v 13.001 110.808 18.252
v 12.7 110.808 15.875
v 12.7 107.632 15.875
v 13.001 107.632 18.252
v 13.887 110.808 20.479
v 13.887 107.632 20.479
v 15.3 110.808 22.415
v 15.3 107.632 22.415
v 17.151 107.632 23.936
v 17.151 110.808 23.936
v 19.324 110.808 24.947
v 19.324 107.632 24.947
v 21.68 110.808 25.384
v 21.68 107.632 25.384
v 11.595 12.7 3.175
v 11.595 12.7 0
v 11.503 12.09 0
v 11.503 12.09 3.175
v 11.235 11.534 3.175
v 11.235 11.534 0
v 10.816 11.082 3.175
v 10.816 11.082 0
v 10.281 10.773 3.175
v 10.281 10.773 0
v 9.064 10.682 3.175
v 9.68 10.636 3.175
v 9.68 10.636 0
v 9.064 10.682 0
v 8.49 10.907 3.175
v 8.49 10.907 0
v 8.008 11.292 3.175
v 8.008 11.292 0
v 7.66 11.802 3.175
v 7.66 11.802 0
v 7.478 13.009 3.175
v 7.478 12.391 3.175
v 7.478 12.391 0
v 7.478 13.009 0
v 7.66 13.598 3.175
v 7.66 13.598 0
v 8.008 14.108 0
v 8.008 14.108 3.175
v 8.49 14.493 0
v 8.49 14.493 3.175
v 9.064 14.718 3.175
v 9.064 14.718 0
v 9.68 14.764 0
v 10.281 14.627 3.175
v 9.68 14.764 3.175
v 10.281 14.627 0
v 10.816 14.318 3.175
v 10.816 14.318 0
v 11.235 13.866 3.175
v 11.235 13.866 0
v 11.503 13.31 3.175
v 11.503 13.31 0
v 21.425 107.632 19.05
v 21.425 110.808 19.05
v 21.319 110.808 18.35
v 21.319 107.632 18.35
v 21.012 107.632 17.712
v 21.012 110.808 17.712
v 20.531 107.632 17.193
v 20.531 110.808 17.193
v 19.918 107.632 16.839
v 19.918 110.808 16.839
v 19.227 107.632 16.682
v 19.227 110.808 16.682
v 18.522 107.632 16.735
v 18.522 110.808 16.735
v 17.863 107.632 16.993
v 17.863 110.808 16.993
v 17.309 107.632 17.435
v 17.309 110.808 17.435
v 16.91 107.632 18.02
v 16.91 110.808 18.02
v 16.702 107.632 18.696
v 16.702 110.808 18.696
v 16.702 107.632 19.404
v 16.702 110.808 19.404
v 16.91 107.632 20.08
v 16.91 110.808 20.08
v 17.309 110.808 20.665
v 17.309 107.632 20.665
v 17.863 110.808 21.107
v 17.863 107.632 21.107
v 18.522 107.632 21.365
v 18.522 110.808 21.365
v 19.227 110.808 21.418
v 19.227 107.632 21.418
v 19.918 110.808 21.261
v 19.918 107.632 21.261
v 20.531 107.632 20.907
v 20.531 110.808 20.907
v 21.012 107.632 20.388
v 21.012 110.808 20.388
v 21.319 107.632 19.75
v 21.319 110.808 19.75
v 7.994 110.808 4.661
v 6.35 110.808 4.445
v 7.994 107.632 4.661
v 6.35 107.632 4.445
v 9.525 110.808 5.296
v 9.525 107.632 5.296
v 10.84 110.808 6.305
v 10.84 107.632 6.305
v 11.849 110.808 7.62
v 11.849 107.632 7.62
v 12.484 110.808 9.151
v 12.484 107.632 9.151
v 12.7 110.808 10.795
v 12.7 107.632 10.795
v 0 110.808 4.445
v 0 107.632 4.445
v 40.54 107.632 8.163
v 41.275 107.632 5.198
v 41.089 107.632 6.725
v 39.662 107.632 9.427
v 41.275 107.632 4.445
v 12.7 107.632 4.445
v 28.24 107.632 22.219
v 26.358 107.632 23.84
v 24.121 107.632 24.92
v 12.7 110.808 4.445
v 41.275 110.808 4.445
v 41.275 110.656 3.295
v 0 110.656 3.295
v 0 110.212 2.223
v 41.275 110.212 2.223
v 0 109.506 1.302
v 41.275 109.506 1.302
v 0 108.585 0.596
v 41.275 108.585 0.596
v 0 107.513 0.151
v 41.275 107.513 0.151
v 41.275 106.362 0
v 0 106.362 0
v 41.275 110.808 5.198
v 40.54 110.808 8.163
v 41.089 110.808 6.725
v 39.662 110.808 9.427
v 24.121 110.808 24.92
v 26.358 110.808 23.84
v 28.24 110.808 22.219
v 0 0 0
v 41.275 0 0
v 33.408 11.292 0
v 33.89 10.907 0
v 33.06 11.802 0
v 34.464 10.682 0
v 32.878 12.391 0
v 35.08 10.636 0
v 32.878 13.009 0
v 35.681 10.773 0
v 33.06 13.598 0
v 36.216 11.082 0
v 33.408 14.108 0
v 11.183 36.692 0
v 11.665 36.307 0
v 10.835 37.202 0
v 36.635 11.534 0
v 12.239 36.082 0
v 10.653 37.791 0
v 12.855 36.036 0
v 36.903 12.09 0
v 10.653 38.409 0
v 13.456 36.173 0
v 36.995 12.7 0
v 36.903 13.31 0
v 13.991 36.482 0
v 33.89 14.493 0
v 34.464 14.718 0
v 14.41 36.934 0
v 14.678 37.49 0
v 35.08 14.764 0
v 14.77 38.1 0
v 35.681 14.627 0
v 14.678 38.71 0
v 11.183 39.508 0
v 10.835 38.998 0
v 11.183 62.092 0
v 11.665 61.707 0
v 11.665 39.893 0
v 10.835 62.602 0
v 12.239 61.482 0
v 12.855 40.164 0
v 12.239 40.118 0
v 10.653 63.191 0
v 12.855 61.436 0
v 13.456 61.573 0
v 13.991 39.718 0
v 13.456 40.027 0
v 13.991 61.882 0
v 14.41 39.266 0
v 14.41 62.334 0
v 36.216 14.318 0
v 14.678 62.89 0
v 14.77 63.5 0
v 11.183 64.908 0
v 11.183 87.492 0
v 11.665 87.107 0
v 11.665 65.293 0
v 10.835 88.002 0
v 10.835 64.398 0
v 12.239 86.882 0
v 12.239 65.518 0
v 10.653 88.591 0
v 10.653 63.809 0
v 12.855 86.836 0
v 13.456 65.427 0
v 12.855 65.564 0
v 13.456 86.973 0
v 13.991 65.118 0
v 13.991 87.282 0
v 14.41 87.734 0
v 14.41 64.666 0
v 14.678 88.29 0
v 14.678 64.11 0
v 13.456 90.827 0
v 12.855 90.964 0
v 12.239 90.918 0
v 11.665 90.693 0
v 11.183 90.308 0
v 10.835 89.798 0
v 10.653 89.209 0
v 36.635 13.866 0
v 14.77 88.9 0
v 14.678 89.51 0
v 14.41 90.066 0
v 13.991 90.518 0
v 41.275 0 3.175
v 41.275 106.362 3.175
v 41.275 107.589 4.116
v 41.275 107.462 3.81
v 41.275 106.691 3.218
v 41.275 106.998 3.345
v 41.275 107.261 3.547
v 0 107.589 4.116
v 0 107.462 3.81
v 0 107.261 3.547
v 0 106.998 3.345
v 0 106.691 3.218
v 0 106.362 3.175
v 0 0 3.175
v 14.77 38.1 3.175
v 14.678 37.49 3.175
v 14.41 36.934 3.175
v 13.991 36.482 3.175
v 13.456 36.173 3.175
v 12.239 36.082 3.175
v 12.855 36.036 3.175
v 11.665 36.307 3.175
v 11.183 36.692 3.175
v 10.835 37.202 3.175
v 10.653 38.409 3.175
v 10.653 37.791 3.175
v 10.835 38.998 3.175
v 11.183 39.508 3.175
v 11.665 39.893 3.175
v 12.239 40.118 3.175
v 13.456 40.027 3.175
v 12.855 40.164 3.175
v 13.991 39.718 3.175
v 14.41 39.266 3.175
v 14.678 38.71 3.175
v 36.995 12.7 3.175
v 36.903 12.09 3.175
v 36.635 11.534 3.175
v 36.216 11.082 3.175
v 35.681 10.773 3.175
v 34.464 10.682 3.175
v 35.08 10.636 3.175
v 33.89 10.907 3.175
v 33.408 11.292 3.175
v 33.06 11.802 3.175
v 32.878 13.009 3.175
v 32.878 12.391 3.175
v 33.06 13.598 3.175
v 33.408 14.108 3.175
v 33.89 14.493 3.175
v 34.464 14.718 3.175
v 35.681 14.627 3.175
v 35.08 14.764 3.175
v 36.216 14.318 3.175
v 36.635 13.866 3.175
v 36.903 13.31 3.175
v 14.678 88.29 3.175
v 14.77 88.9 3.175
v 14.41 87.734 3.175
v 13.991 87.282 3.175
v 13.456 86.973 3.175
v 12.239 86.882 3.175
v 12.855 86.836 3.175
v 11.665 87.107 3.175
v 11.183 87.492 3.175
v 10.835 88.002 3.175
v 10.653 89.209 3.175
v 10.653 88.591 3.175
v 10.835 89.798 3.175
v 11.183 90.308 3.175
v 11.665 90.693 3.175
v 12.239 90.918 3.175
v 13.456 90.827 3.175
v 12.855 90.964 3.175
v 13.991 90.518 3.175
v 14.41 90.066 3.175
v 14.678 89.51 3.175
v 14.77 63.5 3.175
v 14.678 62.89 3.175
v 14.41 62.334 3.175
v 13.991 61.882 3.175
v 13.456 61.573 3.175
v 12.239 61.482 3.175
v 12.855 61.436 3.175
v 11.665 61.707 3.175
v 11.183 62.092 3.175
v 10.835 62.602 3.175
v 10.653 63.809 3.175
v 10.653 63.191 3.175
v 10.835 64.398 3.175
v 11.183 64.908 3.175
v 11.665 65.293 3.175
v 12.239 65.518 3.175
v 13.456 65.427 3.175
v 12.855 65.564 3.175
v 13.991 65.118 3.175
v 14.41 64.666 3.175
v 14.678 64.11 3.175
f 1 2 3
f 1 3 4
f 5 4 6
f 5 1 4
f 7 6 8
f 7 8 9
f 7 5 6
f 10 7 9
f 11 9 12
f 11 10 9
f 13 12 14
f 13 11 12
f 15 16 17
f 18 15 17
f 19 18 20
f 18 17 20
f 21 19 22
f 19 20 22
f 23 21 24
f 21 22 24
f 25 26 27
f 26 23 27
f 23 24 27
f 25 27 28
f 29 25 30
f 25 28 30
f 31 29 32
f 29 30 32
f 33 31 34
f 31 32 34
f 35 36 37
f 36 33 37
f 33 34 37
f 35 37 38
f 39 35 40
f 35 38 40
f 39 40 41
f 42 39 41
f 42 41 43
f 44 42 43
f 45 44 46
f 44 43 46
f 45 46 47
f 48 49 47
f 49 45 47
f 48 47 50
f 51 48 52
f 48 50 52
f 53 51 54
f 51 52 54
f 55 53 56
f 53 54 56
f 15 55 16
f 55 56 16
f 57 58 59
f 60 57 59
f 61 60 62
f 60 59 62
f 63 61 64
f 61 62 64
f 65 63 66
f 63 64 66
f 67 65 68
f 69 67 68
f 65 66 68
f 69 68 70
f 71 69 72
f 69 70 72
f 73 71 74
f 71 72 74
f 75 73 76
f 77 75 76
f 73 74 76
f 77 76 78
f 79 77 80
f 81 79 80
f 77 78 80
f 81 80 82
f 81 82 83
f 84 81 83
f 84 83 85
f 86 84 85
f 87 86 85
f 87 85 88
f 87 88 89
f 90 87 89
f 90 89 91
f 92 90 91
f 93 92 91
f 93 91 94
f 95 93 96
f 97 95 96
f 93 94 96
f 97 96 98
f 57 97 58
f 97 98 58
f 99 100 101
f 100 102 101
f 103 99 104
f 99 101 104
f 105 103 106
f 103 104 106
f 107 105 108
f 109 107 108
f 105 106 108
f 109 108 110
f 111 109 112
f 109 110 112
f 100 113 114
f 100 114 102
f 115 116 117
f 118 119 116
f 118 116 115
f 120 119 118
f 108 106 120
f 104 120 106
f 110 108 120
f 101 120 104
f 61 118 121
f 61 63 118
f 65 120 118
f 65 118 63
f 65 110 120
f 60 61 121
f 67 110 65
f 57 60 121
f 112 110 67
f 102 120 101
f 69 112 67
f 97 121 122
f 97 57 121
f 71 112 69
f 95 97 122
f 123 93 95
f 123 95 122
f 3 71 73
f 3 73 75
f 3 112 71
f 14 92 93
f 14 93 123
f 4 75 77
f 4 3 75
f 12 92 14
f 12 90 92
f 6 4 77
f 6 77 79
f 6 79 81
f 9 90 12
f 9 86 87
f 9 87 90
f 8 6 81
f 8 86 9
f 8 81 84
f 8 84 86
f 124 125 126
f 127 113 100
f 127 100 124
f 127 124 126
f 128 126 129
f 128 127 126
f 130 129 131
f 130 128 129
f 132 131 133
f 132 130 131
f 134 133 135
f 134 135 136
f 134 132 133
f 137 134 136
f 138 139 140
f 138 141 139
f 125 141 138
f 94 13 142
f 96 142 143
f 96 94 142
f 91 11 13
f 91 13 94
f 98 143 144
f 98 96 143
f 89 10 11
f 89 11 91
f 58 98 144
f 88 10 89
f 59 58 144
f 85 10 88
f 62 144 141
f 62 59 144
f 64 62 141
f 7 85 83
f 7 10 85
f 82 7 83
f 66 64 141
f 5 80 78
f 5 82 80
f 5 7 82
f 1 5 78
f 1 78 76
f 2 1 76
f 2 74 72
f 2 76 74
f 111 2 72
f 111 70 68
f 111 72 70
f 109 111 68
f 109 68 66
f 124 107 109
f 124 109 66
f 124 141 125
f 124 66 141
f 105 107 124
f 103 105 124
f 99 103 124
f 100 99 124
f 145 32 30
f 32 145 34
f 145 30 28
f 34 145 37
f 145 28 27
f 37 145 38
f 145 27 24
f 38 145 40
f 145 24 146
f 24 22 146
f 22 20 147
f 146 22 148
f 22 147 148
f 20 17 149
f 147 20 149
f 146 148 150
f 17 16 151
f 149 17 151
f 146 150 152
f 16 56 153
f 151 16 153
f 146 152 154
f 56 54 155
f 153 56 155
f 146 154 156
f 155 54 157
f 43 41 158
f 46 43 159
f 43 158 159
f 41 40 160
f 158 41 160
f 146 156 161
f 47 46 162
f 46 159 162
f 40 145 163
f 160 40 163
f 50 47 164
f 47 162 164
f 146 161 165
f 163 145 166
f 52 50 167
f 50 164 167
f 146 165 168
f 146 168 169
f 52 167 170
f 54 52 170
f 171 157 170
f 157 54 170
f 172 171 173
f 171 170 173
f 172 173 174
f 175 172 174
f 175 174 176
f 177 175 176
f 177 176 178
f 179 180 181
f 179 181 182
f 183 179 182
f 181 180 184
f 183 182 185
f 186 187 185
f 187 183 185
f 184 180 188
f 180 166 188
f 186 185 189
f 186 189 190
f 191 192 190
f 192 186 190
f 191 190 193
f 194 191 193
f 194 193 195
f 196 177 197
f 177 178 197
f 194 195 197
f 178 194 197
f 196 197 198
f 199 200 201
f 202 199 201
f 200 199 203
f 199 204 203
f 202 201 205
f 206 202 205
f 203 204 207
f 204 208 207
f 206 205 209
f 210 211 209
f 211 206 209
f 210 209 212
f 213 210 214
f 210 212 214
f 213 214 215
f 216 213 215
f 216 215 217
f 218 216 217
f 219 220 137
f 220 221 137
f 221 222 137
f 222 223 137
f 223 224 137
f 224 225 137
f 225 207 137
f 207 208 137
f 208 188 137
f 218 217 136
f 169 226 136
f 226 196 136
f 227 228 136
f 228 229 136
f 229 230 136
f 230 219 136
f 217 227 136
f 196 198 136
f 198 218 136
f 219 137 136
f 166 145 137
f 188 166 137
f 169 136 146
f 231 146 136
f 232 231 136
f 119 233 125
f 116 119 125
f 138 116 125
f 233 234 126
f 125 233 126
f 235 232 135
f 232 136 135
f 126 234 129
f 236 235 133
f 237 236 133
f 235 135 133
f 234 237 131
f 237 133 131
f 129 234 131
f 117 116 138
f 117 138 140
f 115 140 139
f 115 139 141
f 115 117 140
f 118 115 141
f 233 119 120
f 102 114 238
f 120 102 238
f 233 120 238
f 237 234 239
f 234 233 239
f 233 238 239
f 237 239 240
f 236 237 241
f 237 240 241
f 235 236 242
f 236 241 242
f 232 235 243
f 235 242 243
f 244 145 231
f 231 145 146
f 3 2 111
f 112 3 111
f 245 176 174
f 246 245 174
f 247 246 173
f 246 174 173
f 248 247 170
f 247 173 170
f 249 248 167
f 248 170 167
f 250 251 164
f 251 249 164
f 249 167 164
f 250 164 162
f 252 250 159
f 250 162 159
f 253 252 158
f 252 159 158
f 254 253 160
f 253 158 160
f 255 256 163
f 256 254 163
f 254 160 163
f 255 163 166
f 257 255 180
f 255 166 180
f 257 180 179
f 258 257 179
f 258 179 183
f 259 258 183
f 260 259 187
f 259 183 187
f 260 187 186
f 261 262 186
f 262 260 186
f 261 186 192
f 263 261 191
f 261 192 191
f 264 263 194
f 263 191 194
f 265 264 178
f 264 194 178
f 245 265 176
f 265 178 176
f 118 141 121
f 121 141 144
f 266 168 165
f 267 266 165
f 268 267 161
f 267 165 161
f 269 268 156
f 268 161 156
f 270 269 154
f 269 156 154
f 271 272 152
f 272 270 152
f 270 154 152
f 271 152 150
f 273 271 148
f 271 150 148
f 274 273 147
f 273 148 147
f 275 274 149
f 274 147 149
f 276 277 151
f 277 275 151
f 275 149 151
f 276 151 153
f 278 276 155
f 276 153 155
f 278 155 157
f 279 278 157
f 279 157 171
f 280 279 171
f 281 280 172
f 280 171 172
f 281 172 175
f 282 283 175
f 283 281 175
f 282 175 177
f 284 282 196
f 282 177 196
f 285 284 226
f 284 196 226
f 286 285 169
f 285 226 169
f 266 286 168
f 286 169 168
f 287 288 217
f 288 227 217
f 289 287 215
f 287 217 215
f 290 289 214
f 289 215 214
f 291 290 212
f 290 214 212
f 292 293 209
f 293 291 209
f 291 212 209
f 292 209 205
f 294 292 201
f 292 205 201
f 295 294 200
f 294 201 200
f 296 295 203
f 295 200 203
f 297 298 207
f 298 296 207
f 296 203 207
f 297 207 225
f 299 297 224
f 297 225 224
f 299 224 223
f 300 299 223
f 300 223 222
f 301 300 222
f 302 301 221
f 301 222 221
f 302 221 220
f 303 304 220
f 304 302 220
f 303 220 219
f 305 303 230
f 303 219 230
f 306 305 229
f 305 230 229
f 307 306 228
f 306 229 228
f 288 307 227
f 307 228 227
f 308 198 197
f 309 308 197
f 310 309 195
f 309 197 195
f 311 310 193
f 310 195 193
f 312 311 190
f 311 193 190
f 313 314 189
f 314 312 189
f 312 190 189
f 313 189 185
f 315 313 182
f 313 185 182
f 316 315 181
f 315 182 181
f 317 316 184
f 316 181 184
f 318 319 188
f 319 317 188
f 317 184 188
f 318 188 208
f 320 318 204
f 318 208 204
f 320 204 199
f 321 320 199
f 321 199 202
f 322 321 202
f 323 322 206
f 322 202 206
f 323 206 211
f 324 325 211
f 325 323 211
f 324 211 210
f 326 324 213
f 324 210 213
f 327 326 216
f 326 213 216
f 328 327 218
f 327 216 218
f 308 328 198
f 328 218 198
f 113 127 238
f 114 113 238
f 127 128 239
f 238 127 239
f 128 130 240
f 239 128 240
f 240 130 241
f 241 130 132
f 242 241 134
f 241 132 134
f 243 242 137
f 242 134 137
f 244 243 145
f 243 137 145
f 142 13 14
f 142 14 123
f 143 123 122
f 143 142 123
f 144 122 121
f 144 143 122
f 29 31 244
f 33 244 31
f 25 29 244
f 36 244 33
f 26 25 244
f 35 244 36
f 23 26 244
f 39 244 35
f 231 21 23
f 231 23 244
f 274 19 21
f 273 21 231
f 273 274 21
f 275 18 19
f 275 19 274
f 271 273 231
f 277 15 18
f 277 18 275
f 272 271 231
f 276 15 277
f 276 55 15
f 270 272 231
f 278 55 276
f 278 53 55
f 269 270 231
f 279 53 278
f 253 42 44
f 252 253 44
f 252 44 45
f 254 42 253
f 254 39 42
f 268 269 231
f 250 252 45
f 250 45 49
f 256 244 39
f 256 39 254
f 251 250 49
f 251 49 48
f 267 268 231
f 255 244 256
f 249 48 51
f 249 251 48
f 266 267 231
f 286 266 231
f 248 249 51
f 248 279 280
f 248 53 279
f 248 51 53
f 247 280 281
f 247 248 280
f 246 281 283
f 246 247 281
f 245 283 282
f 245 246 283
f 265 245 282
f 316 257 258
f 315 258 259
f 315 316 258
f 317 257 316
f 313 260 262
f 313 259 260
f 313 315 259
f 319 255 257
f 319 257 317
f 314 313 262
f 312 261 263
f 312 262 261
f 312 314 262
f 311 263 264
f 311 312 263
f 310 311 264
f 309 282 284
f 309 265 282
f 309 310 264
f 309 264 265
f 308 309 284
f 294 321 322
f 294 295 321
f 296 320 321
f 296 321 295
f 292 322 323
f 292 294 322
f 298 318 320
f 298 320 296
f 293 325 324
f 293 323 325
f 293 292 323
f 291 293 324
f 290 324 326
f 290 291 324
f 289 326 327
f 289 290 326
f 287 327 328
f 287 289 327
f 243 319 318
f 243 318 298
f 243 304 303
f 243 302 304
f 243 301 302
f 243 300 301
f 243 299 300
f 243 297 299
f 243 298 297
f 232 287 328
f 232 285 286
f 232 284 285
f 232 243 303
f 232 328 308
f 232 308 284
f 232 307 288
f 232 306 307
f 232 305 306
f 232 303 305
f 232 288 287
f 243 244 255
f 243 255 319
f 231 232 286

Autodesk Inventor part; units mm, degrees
ref_plane "YZ Plane" through (0, 0, 0) normal (1, 0, 0) x (0, 1, 0)
ref_plane "XZ Plane" through (0, 0, 0) normal (0, 1, 0) x (-1, 0, 0)
ref_plane "XY Plane" through (0, 0, 0) normal (0, 0, 1) x (1, 0, 0)
sketch "Sketch1 outline for Plate1" plane through (0, 0, 0) normal (0, 0, 1) x (1, 0, 0)
  line L0 (0, 106.3625) -> (0, 0)
  line L1 (41.275, 106.3625) -> (0, 106.3625)
  line L2 (0, 0) -> (41.275, 0)
  line L3 (41.275, 0) -> (41.275, 106.3625)
  circle A0 centre (9.525, 12.7) radius 2.0701
  circle A1 centre (12.7, 38.1) radius 2.0701
  circle A2 centre (34.925, 12.7) radius 2.0701
  circle A3 centre (12.7, 63.5) radius 2.0701
  circle A4 centre (12.7, 88.9) radius 2.0701
extrude "Plate1" add sketch "Sketch1 outline for Plate1" along normal blind 3.175
sketch "Sketch2" plane through (0, 107.6325, 4.445) normal (0, 1, 0) x (-1, 0, 0)
  line L0 (-41.275, 0) -> (0, 0)
  line L1 (0, 0) -> (0, 20.955)
  line L2 (0, 20.955) -> (-41.275, 20.955)
  line L3 (-41.275, 20.955) -> (-41.275, 0)
edge flange "Flange1" height 25.4 angle 90 thickness 3.175 bend radius 1.27 thickness toward (0, 1, 0) relief tear relief width 3.175 relief depth 1.5875 edges at (20.6375, 106.3625, 3.175) wall of the first edge with corners at (41.275, 107.6325, 4.445) (0, 107.6325, 4.445) (0, 107.6325, 25.4) (41.275, 107.6325, 25.4)
bend "Bend1"
corner "Corner1"
sketch "Sketch1" plane through (0, 0, 0) normal (0, 0, 1) x (1, 0, 0)
  line L0 (110.551814, -41.275) -> (0, -41.275)
  line L1 (110.551814, -34.925) -> (110.551814, -41.275)
  line L2 (0, 0) -> (111.304505, 0)
  line L3 (106.3625, 0) -> (110.551814, 0)
  line L4 (110.551814, 0) -> (110.551814, -3.175)
  line L5 (110.551814, -3.175) -> (106.3625, -3.175)
  line L6 (106.3625, -3.175) -> (106.3625, 0)
  line L7 (106.3625, 0) -> (106.3625, -41.275)
  line L8 (110.551814, 0) -> (110.551814, -34.925)
  line L9 (106.3625, -38.1) -> (110.551814, -38.1)
  line L10 (110.551814, -38.1) -> (110.551814, -41.275)
  line L11 (110.551814, -41.275) -> (106.3625, -41.275)
  line L12 (106.3625, -41.275) -> (106.3625, -38.1)
  dimension "d6" = 25.4
  dimension "d22" = 12.7
  dimension "d36" = 6.35
  dimension "d38" = 12.7
  dimension "d39" = 38.1
  dimension "d42" = 25.4
sketch "Sketch4" plane through (0, 110.8075, 25.4) normal (0, 1, 0) x (1, 0, 0)
  line L0 (41.275, 0) -> (0, 0)
  circle A0 centre (19.05, 6.35) radius 2.3749
  line L1 (0, 0) -> (0, 20.955)
  line L2 (0, 20.955) -> (41.275, 20.955)
  line L3 (41.275, 20.955) -> (41.275, 21.413463)
  line L4 (21.135301, 0) -> (22.225, 0)
  line L5 (0, 0) -> (0, 20.955)
  line L6 (41.275, 20.955) -> (0, 20.955)
  line L7 (41.275, 20.955) -> (41.275, 17.78)
  line L8 (41.275, 17.78) -> (28.240357, 3.1812)
  line L9 (12.7, 9.525) -> (12.7, 20.955)
  arc A1 (12.7, 9.525) -> (21.68015, 0.015596) centre (22.225, 9.525) ccw
  arc A2 (21.68015, 0.015596) -> (28.240357, 3.1812) centre (21.135301, 9.525) ccw
  line L10 (41.275, 20.955) -> (41.275, 0)
  line L11 (0, 0) -> (41.275, 0)
  line L12 (41.275, 0) -> (41.275, 20.955)
  point P0 (0, 25.4)
  point P1 (12.7, 0)
  point P2 (25.4, 0)
  point P3 (12.7, 0)
  dimension "d28" = 4.7498
  dimension "d29" = 6.35
  dimension "d34" = 19.05
  dimension "d47" = 3.175
  dimension "d48" = 6.35
  dimension "d49" = 6.35
  dimension "d50" = 9.525
extrude "Cut3" cut sketch "Sketch4" against normal blind 3.175 contours L0 L1 L2 L9 A1 A2 L8 L10 | A0
fillet "Fillet3" radius 6.35 2 edges at (41.275, 109.22, 7.62) (12.7, 109.22, 4.445)
equation "\"d51\" = Thickness"
equation "\"d12\" = BendReliefWidth"
equation "\"d13\" = BendReliefDepth"
equation "\"d14\" = MinimumRemnant"
equation "\"d15\" = BendRadius"
equation "\"d19\" = CornerReliefSize"
equation "\"d20\" = GapSize"
equation "\"d21\" = JacobiRadiusSize"
equation "\"BendRadius\" = Thickness"
equation "\"BendReliefWidth\" = Thickness"
equation "\"BendReliefDepth\" = 0.5 * Thickness"
equation "\"CornerReliefSize\" = 4 * Thickness"
equation "\"MinimumRemnant\" = 2 * Thickness"
equation "\"TransitionRadius\" = BendRadius"
equation "\"JacobiRadiusSize\" = BendRadius"
equation "\"GapSize\" = Thickness"
equation "\"d11\" = BendRadius"
equation "\"Thickness\" = 3.175"
properties part number "Pneumatic Piston Front Flange (Left Custom)" material "Aluminum 6061"
